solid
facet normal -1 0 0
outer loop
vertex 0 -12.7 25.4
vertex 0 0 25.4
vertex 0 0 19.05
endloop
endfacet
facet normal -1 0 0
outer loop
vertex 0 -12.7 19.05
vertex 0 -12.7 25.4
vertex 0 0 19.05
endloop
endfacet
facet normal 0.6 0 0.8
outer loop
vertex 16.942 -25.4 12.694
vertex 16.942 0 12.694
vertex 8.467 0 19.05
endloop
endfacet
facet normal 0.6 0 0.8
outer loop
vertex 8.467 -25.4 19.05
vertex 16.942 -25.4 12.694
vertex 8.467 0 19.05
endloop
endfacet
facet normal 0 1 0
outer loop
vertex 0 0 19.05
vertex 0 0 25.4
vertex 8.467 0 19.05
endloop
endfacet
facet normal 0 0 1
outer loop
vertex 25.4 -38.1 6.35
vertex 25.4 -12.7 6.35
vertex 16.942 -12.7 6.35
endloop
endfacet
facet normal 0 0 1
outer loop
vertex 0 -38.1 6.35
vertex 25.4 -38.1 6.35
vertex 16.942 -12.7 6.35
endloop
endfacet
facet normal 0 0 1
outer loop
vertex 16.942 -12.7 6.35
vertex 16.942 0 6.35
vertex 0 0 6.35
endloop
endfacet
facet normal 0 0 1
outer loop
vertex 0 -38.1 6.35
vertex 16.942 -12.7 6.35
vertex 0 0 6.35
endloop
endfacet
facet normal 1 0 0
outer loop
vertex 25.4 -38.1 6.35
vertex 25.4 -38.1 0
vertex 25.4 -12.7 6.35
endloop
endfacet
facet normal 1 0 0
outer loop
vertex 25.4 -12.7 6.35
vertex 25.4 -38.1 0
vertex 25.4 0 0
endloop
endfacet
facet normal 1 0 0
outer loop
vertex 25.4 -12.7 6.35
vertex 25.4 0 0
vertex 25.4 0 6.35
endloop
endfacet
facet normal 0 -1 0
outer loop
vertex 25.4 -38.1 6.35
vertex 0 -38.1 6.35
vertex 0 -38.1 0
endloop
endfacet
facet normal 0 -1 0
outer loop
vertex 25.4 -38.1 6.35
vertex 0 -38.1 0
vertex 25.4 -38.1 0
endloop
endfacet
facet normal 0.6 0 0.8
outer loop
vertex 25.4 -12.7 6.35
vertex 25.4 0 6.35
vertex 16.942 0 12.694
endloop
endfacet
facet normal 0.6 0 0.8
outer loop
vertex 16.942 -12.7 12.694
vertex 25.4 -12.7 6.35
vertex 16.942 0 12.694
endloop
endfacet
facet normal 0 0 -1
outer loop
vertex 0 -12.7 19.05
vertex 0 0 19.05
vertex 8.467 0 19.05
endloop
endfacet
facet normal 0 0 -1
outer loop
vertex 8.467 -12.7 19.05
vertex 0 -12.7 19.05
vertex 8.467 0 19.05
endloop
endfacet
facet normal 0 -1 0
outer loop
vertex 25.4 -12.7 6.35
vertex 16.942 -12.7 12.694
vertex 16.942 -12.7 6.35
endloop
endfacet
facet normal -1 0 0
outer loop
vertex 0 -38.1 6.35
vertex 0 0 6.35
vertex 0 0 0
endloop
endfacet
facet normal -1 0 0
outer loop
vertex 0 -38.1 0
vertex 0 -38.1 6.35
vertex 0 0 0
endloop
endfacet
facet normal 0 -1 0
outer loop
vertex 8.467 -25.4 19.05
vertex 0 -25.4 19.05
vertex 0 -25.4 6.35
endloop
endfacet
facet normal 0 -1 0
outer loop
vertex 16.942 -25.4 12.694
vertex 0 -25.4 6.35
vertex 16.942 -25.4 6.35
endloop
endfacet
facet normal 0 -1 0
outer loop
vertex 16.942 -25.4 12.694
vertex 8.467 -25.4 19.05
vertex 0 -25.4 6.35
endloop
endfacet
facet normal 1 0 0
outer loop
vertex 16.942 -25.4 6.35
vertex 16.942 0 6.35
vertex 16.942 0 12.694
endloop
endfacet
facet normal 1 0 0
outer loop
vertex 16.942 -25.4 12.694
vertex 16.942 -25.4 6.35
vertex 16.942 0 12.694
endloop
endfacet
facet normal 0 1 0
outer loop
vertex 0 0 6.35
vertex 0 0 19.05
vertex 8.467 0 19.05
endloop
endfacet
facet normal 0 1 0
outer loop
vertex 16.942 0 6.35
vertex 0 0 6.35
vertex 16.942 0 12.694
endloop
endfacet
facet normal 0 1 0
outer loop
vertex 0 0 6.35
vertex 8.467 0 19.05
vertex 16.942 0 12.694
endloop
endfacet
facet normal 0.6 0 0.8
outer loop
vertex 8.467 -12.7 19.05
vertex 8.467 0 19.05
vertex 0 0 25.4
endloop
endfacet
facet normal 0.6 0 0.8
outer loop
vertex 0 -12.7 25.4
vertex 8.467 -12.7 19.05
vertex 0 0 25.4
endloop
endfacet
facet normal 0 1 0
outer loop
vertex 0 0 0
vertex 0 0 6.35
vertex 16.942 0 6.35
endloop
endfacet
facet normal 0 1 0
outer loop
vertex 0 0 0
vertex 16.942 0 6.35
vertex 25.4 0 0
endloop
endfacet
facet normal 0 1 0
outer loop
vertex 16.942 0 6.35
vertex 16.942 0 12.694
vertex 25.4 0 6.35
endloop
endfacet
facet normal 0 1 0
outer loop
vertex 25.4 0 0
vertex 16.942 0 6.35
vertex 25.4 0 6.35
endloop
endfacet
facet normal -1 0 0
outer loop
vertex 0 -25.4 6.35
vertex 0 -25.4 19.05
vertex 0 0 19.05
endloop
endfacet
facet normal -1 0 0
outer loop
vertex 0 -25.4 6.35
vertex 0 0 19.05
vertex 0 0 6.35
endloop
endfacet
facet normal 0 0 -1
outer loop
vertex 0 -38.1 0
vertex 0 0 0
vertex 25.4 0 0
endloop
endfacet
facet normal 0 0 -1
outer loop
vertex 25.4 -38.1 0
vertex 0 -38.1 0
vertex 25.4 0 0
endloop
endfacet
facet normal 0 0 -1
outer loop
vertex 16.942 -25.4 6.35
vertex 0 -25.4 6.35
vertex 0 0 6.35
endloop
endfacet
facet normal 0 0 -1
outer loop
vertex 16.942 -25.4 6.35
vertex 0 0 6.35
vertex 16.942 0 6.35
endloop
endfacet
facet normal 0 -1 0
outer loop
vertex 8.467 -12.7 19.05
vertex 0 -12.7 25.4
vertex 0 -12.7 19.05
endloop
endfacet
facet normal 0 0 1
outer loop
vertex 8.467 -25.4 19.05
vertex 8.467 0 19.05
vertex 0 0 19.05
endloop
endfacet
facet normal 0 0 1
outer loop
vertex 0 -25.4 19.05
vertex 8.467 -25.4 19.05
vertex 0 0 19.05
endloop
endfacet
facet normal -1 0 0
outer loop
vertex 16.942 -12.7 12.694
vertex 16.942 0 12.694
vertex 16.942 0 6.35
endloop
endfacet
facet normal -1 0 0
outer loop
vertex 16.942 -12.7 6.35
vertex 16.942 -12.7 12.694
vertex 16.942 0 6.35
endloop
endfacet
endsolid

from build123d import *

# Parameters (mm, degrees)
F1_DEPTH = 38.1
F2_DEPTH = 12.7
F3_DEPTH = 25.4


with BuildPart() as f1:
    # F0 (on Front) → F1 (new body)
    with BuildSketch(Plane.XZ):
        Polygon((0, 6.35), (0, 0), (25.4, 0), (25.4, 6.35), (16.9418, 6.35), align=None)
    extrude(amount=F1_DEPTH)

    # F0 (on Front) → F2 (join)
    with BuildSketch(Plane.XZ):
        Polygon((0, 25.4), (0, 19.05), (8.466667, 19.05), align=None)
        Polygon((16.9418, 6.35), (25.4, 6.35), (16.9418, 12.69365), align=None)
    extrude(amount=F2_DEPTH)


with BuildPart() as f3:
    # F0 (on Front) → F3 (new body)
    with BuildSketch(Plane.XZ):
        Polygon((0, 19.05), (0, 6.35), (16.9418, 6.35), (16.9418, 12.69365), (8.466667, 19.05), align=None)
    extrude(amount=F3_DEPTH)


solid = Compound([f1.part, f3.part])
